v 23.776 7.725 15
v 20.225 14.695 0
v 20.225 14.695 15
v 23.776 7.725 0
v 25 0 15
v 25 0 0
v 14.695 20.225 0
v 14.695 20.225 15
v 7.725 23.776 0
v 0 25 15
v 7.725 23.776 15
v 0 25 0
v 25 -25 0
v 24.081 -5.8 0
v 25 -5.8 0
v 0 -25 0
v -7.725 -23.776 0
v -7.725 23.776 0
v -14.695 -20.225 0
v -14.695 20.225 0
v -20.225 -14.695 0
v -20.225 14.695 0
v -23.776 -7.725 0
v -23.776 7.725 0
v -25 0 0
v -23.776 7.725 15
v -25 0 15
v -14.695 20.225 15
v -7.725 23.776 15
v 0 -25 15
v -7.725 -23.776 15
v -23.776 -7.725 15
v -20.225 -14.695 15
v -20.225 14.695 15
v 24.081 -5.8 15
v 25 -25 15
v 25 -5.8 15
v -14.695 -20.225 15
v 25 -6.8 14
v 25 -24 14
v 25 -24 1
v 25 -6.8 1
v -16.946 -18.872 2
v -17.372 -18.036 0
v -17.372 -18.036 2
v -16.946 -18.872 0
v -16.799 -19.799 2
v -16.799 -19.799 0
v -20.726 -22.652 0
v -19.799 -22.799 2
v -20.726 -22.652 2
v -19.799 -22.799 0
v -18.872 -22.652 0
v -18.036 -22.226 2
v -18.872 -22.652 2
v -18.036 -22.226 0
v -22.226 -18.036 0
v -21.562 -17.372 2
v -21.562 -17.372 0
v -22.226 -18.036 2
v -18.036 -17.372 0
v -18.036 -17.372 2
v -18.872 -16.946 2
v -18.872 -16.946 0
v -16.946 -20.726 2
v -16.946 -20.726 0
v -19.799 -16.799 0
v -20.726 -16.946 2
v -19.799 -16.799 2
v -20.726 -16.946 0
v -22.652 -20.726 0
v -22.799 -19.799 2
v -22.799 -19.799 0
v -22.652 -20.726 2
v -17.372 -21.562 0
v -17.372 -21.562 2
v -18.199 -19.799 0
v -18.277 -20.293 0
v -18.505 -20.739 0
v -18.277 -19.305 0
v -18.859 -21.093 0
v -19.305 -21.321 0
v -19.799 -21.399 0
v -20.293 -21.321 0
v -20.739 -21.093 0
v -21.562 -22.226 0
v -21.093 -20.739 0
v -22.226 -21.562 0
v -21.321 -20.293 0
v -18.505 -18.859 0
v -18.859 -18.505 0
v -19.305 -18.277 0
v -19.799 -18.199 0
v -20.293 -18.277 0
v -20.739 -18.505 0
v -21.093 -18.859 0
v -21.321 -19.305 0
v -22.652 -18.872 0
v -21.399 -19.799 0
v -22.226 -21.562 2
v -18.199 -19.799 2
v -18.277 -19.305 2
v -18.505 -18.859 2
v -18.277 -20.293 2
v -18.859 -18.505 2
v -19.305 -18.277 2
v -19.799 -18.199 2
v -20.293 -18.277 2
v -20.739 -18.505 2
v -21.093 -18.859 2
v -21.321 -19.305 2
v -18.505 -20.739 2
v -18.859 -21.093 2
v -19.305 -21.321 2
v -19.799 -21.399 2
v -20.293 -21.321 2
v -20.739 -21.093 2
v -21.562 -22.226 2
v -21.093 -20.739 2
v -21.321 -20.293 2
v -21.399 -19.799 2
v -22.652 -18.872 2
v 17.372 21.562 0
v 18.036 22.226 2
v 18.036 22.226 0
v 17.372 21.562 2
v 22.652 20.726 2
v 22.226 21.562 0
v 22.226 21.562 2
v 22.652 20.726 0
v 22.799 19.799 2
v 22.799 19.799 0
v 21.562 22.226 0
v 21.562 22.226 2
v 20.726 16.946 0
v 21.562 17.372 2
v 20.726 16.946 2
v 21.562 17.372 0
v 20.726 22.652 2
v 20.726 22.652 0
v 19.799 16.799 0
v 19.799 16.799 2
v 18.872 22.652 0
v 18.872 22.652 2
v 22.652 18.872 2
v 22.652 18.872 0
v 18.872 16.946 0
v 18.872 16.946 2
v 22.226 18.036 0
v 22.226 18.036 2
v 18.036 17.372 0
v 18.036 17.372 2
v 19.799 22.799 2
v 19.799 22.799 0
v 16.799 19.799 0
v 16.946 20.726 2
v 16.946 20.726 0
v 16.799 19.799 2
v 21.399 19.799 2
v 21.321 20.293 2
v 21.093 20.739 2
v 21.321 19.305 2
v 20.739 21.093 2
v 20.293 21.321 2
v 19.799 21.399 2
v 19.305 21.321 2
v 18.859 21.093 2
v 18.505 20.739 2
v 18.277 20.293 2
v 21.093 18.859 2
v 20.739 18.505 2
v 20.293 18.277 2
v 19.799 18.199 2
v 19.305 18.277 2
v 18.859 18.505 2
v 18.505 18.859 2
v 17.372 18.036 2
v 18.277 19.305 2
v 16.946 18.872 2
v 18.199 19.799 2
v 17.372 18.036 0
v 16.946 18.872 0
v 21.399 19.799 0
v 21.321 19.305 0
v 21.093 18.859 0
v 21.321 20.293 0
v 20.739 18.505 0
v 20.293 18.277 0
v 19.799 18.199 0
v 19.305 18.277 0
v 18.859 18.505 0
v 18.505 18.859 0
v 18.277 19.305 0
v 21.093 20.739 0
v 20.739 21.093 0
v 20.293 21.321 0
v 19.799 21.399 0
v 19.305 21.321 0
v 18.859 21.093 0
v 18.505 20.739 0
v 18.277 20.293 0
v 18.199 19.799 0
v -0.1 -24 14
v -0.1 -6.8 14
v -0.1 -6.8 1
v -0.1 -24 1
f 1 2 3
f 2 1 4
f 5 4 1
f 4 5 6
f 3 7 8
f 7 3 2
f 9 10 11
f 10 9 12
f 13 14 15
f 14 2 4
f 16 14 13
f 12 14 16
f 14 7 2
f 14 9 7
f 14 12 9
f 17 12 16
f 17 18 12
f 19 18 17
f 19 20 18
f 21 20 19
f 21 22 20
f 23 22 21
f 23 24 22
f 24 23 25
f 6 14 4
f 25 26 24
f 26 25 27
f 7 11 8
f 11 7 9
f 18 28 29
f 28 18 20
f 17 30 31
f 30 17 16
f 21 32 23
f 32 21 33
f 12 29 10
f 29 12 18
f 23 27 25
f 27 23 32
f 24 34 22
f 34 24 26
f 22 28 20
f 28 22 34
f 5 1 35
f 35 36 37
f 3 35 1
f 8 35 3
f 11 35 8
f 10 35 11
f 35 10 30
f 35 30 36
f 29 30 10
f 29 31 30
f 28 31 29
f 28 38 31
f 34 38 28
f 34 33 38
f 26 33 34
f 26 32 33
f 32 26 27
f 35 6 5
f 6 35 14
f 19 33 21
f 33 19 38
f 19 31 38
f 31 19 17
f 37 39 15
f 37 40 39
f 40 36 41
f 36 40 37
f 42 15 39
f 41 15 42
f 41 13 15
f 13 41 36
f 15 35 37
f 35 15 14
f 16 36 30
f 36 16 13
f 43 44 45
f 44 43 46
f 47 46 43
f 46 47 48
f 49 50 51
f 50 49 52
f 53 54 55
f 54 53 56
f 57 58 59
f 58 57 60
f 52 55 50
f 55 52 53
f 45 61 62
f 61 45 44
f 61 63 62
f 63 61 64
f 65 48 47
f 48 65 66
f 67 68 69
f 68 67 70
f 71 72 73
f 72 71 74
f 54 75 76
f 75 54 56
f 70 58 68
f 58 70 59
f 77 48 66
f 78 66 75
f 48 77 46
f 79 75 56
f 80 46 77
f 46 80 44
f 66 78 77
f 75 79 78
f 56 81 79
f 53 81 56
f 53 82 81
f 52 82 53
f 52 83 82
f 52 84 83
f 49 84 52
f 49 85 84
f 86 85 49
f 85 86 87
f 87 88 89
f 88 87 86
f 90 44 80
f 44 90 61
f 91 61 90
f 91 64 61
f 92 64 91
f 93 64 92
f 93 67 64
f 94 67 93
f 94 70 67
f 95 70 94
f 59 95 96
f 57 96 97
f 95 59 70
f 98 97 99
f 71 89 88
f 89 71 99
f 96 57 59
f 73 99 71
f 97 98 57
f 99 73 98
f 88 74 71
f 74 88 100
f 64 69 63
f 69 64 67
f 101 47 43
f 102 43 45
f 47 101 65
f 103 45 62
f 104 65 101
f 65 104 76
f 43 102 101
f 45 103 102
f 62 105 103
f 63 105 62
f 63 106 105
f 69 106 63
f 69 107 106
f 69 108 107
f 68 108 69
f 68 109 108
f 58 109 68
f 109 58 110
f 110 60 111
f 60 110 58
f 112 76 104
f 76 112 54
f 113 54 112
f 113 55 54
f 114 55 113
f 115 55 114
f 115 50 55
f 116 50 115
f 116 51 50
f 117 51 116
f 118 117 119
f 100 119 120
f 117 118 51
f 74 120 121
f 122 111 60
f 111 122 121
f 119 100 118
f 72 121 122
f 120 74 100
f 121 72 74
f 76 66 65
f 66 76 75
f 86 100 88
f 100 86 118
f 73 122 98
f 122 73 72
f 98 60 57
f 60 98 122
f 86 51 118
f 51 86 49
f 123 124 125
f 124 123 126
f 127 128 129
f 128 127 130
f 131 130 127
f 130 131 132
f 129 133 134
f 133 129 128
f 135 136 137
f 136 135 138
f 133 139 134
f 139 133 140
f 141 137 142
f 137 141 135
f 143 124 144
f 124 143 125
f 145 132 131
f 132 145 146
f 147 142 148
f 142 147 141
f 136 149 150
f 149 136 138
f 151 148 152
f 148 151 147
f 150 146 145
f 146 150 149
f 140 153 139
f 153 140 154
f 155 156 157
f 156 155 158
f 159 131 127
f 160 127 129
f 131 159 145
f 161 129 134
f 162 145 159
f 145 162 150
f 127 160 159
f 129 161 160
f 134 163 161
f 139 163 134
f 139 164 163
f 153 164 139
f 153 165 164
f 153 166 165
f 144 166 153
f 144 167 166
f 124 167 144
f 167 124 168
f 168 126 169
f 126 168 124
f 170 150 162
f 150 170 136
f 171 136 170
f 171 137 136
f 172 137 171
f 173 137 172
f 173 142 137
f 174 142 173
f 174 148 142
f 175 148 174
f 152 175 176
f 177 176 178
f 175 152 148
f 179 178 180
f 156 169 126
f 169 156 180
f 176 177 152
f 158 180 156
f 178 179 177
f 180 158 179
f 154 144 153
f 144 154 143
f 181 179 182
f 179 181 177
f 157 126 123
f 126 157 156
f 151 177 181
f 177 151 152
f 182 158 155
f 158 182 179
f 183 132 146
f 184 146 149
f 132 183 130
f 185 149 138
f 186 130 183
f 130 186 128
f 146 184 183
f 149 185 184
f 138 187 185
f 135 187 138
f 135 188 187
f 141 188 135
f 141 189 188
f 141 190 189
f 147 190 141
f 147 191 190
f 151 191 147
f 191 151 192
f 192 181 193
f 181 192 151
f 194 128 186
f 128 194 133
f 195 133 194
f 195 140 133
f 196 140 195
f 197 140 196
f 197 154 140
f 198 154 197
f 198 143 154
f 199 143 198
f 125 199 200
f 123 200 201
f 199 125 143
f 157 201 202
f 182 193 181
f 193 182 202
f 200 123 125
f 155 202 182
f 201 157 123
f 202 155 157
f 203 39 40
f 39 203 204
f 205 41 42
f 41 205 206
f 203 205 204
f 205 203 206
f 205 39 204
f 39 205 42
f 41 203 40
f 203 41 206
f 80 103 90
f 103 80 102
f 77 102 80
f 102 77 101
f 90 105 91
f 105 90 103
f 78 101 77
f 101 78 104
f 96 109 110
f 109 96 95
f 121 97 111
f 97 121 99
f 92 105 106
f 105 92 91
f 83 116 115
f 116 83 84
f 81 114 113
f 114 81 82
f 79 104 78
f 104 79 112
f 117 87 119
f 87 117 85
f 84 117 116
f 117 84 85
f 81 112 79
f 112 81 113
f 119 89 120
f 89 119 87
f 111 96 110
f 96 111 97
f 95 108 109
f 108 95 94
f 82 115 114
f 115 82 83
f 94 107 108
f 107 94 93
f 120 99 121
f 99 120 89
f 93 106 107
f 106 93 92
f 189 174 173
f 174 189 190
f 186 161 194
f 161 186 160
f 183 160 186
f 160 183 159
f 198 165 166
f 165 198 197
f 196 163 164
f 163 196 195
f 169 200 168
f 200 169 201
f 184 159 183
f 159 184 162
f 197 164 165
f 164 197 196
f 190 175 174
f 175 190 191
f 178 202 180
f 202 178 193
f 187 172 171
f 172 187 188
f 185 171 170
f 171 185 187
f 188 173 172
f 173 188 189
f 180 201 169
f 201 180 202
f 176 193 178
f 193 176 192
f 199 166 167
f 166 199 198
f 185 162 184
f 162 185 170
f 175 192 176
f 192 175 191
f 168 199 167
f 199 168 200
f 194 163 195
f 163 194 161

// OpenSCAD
// file: Param.scad
//axe : disponible : 320*2/350*2/370*2/470*4/405*2
axe_x = 370;
axe_y = 470;
axe_z = 370;

Frame_e = 16;
coulisse_d = 8;
angle_e=3.5;

// Constant
r608z_d=8;
r608z_D=22;
r608z_e=7;

nema17_L=42;
nema17_axe_d=5.2;

Pulley_GT2_8_e=17.5;
Pulley_GT2_8_D=26;
Pulley_GT2_8_tooth_w=6.2;

GT2_w=6;

BagueLaiton_D=12;
BagueLaiton_L=30;

Vis_m3_p = 3.2;
Vis_m3_t = 5;

Head_x = BagueLaiton_D/2+12;
Head_y = coulisse_d/2+20;
Head_z = 20;

Fan_radial_e_h=15;
Fan_radial_e_l=19.2;

// resolution of round object. each line segment is fnr mm long. fnr = 1 crude and good for development (its faster), aim for fnr = 0.4 or smaller for a production render. smaller means more details (and a lot more time to render).
resolution = 0.4;
// detail level
detaillevel = 1; // [0:coarse render only outlines,1:fine render with all details]
// 
withfan = 0; // [0:render without fan frame,1:render with fan frame]

_globalResolution = 20;

// Data
Frame_L = axe_x-Pulley_GT2_8_e-angle_e+Frame_e;
Frame_l = axe_y-Pulley_GT2_8_e-angle_e+Frame_e;
Frame_h = axe_z;

coulisse_e = 3*coulisse_d+1;
coulisse_eh = (r608z_D*1.7)/2+4;
coulisse_ec = r608z_D+10;

Cross_ec = BagueLaiton_D+1;

angle_h=coulisse_e+coulisse_eh+r608z_D;
// main file
include <Param.scad>;

module fanRadial() {
    d=50;
    h=Fan_radial_e_h;
    fix_r=3;
    color("dimgrey")
        difference() {
            union() {
                cylinder(d=d,h=h, $fn=_globalResolution);
                translate([d/4,Fan_radial_e_l/2-d/2,h/2]) cube([d/2,Fan_radial_e_l, h], center=true);
                translate([-cos(45)*(d/2+fix_r),-sin(45)*(d/2+fix_r),0]) cylinder(r=fix_r,h=2 , $fn=_globalResolution);
                translate([+cos(45)*(d/2+fix_r),+sin(45)*(d/2+fix_r),0]) cylinder(r=fix_r,h=2 , $fn=_globalResolution);
        }
        translate([d/4,Fan_radial_e_l/2-d/2,h/2]) cube([d/2+0.2,Fan_radial_e_l-2, h-2], center=true);
        translate([-cos(45)*(d/2+fix_r),-sin(45)*(d/2+fix_r),-0.1]) cylinder(d=Vis_m3_p,h=2.2 , $fn=_globalResolution);
        translate([+cos(45)*(d/2+fix_r),+sin(45)*(d/2+fix_r),-0.1]) cylinder(d=Vis_m3_p,h=2.2 , $fn=_globalResolution);
    }
}

fanRadial();
